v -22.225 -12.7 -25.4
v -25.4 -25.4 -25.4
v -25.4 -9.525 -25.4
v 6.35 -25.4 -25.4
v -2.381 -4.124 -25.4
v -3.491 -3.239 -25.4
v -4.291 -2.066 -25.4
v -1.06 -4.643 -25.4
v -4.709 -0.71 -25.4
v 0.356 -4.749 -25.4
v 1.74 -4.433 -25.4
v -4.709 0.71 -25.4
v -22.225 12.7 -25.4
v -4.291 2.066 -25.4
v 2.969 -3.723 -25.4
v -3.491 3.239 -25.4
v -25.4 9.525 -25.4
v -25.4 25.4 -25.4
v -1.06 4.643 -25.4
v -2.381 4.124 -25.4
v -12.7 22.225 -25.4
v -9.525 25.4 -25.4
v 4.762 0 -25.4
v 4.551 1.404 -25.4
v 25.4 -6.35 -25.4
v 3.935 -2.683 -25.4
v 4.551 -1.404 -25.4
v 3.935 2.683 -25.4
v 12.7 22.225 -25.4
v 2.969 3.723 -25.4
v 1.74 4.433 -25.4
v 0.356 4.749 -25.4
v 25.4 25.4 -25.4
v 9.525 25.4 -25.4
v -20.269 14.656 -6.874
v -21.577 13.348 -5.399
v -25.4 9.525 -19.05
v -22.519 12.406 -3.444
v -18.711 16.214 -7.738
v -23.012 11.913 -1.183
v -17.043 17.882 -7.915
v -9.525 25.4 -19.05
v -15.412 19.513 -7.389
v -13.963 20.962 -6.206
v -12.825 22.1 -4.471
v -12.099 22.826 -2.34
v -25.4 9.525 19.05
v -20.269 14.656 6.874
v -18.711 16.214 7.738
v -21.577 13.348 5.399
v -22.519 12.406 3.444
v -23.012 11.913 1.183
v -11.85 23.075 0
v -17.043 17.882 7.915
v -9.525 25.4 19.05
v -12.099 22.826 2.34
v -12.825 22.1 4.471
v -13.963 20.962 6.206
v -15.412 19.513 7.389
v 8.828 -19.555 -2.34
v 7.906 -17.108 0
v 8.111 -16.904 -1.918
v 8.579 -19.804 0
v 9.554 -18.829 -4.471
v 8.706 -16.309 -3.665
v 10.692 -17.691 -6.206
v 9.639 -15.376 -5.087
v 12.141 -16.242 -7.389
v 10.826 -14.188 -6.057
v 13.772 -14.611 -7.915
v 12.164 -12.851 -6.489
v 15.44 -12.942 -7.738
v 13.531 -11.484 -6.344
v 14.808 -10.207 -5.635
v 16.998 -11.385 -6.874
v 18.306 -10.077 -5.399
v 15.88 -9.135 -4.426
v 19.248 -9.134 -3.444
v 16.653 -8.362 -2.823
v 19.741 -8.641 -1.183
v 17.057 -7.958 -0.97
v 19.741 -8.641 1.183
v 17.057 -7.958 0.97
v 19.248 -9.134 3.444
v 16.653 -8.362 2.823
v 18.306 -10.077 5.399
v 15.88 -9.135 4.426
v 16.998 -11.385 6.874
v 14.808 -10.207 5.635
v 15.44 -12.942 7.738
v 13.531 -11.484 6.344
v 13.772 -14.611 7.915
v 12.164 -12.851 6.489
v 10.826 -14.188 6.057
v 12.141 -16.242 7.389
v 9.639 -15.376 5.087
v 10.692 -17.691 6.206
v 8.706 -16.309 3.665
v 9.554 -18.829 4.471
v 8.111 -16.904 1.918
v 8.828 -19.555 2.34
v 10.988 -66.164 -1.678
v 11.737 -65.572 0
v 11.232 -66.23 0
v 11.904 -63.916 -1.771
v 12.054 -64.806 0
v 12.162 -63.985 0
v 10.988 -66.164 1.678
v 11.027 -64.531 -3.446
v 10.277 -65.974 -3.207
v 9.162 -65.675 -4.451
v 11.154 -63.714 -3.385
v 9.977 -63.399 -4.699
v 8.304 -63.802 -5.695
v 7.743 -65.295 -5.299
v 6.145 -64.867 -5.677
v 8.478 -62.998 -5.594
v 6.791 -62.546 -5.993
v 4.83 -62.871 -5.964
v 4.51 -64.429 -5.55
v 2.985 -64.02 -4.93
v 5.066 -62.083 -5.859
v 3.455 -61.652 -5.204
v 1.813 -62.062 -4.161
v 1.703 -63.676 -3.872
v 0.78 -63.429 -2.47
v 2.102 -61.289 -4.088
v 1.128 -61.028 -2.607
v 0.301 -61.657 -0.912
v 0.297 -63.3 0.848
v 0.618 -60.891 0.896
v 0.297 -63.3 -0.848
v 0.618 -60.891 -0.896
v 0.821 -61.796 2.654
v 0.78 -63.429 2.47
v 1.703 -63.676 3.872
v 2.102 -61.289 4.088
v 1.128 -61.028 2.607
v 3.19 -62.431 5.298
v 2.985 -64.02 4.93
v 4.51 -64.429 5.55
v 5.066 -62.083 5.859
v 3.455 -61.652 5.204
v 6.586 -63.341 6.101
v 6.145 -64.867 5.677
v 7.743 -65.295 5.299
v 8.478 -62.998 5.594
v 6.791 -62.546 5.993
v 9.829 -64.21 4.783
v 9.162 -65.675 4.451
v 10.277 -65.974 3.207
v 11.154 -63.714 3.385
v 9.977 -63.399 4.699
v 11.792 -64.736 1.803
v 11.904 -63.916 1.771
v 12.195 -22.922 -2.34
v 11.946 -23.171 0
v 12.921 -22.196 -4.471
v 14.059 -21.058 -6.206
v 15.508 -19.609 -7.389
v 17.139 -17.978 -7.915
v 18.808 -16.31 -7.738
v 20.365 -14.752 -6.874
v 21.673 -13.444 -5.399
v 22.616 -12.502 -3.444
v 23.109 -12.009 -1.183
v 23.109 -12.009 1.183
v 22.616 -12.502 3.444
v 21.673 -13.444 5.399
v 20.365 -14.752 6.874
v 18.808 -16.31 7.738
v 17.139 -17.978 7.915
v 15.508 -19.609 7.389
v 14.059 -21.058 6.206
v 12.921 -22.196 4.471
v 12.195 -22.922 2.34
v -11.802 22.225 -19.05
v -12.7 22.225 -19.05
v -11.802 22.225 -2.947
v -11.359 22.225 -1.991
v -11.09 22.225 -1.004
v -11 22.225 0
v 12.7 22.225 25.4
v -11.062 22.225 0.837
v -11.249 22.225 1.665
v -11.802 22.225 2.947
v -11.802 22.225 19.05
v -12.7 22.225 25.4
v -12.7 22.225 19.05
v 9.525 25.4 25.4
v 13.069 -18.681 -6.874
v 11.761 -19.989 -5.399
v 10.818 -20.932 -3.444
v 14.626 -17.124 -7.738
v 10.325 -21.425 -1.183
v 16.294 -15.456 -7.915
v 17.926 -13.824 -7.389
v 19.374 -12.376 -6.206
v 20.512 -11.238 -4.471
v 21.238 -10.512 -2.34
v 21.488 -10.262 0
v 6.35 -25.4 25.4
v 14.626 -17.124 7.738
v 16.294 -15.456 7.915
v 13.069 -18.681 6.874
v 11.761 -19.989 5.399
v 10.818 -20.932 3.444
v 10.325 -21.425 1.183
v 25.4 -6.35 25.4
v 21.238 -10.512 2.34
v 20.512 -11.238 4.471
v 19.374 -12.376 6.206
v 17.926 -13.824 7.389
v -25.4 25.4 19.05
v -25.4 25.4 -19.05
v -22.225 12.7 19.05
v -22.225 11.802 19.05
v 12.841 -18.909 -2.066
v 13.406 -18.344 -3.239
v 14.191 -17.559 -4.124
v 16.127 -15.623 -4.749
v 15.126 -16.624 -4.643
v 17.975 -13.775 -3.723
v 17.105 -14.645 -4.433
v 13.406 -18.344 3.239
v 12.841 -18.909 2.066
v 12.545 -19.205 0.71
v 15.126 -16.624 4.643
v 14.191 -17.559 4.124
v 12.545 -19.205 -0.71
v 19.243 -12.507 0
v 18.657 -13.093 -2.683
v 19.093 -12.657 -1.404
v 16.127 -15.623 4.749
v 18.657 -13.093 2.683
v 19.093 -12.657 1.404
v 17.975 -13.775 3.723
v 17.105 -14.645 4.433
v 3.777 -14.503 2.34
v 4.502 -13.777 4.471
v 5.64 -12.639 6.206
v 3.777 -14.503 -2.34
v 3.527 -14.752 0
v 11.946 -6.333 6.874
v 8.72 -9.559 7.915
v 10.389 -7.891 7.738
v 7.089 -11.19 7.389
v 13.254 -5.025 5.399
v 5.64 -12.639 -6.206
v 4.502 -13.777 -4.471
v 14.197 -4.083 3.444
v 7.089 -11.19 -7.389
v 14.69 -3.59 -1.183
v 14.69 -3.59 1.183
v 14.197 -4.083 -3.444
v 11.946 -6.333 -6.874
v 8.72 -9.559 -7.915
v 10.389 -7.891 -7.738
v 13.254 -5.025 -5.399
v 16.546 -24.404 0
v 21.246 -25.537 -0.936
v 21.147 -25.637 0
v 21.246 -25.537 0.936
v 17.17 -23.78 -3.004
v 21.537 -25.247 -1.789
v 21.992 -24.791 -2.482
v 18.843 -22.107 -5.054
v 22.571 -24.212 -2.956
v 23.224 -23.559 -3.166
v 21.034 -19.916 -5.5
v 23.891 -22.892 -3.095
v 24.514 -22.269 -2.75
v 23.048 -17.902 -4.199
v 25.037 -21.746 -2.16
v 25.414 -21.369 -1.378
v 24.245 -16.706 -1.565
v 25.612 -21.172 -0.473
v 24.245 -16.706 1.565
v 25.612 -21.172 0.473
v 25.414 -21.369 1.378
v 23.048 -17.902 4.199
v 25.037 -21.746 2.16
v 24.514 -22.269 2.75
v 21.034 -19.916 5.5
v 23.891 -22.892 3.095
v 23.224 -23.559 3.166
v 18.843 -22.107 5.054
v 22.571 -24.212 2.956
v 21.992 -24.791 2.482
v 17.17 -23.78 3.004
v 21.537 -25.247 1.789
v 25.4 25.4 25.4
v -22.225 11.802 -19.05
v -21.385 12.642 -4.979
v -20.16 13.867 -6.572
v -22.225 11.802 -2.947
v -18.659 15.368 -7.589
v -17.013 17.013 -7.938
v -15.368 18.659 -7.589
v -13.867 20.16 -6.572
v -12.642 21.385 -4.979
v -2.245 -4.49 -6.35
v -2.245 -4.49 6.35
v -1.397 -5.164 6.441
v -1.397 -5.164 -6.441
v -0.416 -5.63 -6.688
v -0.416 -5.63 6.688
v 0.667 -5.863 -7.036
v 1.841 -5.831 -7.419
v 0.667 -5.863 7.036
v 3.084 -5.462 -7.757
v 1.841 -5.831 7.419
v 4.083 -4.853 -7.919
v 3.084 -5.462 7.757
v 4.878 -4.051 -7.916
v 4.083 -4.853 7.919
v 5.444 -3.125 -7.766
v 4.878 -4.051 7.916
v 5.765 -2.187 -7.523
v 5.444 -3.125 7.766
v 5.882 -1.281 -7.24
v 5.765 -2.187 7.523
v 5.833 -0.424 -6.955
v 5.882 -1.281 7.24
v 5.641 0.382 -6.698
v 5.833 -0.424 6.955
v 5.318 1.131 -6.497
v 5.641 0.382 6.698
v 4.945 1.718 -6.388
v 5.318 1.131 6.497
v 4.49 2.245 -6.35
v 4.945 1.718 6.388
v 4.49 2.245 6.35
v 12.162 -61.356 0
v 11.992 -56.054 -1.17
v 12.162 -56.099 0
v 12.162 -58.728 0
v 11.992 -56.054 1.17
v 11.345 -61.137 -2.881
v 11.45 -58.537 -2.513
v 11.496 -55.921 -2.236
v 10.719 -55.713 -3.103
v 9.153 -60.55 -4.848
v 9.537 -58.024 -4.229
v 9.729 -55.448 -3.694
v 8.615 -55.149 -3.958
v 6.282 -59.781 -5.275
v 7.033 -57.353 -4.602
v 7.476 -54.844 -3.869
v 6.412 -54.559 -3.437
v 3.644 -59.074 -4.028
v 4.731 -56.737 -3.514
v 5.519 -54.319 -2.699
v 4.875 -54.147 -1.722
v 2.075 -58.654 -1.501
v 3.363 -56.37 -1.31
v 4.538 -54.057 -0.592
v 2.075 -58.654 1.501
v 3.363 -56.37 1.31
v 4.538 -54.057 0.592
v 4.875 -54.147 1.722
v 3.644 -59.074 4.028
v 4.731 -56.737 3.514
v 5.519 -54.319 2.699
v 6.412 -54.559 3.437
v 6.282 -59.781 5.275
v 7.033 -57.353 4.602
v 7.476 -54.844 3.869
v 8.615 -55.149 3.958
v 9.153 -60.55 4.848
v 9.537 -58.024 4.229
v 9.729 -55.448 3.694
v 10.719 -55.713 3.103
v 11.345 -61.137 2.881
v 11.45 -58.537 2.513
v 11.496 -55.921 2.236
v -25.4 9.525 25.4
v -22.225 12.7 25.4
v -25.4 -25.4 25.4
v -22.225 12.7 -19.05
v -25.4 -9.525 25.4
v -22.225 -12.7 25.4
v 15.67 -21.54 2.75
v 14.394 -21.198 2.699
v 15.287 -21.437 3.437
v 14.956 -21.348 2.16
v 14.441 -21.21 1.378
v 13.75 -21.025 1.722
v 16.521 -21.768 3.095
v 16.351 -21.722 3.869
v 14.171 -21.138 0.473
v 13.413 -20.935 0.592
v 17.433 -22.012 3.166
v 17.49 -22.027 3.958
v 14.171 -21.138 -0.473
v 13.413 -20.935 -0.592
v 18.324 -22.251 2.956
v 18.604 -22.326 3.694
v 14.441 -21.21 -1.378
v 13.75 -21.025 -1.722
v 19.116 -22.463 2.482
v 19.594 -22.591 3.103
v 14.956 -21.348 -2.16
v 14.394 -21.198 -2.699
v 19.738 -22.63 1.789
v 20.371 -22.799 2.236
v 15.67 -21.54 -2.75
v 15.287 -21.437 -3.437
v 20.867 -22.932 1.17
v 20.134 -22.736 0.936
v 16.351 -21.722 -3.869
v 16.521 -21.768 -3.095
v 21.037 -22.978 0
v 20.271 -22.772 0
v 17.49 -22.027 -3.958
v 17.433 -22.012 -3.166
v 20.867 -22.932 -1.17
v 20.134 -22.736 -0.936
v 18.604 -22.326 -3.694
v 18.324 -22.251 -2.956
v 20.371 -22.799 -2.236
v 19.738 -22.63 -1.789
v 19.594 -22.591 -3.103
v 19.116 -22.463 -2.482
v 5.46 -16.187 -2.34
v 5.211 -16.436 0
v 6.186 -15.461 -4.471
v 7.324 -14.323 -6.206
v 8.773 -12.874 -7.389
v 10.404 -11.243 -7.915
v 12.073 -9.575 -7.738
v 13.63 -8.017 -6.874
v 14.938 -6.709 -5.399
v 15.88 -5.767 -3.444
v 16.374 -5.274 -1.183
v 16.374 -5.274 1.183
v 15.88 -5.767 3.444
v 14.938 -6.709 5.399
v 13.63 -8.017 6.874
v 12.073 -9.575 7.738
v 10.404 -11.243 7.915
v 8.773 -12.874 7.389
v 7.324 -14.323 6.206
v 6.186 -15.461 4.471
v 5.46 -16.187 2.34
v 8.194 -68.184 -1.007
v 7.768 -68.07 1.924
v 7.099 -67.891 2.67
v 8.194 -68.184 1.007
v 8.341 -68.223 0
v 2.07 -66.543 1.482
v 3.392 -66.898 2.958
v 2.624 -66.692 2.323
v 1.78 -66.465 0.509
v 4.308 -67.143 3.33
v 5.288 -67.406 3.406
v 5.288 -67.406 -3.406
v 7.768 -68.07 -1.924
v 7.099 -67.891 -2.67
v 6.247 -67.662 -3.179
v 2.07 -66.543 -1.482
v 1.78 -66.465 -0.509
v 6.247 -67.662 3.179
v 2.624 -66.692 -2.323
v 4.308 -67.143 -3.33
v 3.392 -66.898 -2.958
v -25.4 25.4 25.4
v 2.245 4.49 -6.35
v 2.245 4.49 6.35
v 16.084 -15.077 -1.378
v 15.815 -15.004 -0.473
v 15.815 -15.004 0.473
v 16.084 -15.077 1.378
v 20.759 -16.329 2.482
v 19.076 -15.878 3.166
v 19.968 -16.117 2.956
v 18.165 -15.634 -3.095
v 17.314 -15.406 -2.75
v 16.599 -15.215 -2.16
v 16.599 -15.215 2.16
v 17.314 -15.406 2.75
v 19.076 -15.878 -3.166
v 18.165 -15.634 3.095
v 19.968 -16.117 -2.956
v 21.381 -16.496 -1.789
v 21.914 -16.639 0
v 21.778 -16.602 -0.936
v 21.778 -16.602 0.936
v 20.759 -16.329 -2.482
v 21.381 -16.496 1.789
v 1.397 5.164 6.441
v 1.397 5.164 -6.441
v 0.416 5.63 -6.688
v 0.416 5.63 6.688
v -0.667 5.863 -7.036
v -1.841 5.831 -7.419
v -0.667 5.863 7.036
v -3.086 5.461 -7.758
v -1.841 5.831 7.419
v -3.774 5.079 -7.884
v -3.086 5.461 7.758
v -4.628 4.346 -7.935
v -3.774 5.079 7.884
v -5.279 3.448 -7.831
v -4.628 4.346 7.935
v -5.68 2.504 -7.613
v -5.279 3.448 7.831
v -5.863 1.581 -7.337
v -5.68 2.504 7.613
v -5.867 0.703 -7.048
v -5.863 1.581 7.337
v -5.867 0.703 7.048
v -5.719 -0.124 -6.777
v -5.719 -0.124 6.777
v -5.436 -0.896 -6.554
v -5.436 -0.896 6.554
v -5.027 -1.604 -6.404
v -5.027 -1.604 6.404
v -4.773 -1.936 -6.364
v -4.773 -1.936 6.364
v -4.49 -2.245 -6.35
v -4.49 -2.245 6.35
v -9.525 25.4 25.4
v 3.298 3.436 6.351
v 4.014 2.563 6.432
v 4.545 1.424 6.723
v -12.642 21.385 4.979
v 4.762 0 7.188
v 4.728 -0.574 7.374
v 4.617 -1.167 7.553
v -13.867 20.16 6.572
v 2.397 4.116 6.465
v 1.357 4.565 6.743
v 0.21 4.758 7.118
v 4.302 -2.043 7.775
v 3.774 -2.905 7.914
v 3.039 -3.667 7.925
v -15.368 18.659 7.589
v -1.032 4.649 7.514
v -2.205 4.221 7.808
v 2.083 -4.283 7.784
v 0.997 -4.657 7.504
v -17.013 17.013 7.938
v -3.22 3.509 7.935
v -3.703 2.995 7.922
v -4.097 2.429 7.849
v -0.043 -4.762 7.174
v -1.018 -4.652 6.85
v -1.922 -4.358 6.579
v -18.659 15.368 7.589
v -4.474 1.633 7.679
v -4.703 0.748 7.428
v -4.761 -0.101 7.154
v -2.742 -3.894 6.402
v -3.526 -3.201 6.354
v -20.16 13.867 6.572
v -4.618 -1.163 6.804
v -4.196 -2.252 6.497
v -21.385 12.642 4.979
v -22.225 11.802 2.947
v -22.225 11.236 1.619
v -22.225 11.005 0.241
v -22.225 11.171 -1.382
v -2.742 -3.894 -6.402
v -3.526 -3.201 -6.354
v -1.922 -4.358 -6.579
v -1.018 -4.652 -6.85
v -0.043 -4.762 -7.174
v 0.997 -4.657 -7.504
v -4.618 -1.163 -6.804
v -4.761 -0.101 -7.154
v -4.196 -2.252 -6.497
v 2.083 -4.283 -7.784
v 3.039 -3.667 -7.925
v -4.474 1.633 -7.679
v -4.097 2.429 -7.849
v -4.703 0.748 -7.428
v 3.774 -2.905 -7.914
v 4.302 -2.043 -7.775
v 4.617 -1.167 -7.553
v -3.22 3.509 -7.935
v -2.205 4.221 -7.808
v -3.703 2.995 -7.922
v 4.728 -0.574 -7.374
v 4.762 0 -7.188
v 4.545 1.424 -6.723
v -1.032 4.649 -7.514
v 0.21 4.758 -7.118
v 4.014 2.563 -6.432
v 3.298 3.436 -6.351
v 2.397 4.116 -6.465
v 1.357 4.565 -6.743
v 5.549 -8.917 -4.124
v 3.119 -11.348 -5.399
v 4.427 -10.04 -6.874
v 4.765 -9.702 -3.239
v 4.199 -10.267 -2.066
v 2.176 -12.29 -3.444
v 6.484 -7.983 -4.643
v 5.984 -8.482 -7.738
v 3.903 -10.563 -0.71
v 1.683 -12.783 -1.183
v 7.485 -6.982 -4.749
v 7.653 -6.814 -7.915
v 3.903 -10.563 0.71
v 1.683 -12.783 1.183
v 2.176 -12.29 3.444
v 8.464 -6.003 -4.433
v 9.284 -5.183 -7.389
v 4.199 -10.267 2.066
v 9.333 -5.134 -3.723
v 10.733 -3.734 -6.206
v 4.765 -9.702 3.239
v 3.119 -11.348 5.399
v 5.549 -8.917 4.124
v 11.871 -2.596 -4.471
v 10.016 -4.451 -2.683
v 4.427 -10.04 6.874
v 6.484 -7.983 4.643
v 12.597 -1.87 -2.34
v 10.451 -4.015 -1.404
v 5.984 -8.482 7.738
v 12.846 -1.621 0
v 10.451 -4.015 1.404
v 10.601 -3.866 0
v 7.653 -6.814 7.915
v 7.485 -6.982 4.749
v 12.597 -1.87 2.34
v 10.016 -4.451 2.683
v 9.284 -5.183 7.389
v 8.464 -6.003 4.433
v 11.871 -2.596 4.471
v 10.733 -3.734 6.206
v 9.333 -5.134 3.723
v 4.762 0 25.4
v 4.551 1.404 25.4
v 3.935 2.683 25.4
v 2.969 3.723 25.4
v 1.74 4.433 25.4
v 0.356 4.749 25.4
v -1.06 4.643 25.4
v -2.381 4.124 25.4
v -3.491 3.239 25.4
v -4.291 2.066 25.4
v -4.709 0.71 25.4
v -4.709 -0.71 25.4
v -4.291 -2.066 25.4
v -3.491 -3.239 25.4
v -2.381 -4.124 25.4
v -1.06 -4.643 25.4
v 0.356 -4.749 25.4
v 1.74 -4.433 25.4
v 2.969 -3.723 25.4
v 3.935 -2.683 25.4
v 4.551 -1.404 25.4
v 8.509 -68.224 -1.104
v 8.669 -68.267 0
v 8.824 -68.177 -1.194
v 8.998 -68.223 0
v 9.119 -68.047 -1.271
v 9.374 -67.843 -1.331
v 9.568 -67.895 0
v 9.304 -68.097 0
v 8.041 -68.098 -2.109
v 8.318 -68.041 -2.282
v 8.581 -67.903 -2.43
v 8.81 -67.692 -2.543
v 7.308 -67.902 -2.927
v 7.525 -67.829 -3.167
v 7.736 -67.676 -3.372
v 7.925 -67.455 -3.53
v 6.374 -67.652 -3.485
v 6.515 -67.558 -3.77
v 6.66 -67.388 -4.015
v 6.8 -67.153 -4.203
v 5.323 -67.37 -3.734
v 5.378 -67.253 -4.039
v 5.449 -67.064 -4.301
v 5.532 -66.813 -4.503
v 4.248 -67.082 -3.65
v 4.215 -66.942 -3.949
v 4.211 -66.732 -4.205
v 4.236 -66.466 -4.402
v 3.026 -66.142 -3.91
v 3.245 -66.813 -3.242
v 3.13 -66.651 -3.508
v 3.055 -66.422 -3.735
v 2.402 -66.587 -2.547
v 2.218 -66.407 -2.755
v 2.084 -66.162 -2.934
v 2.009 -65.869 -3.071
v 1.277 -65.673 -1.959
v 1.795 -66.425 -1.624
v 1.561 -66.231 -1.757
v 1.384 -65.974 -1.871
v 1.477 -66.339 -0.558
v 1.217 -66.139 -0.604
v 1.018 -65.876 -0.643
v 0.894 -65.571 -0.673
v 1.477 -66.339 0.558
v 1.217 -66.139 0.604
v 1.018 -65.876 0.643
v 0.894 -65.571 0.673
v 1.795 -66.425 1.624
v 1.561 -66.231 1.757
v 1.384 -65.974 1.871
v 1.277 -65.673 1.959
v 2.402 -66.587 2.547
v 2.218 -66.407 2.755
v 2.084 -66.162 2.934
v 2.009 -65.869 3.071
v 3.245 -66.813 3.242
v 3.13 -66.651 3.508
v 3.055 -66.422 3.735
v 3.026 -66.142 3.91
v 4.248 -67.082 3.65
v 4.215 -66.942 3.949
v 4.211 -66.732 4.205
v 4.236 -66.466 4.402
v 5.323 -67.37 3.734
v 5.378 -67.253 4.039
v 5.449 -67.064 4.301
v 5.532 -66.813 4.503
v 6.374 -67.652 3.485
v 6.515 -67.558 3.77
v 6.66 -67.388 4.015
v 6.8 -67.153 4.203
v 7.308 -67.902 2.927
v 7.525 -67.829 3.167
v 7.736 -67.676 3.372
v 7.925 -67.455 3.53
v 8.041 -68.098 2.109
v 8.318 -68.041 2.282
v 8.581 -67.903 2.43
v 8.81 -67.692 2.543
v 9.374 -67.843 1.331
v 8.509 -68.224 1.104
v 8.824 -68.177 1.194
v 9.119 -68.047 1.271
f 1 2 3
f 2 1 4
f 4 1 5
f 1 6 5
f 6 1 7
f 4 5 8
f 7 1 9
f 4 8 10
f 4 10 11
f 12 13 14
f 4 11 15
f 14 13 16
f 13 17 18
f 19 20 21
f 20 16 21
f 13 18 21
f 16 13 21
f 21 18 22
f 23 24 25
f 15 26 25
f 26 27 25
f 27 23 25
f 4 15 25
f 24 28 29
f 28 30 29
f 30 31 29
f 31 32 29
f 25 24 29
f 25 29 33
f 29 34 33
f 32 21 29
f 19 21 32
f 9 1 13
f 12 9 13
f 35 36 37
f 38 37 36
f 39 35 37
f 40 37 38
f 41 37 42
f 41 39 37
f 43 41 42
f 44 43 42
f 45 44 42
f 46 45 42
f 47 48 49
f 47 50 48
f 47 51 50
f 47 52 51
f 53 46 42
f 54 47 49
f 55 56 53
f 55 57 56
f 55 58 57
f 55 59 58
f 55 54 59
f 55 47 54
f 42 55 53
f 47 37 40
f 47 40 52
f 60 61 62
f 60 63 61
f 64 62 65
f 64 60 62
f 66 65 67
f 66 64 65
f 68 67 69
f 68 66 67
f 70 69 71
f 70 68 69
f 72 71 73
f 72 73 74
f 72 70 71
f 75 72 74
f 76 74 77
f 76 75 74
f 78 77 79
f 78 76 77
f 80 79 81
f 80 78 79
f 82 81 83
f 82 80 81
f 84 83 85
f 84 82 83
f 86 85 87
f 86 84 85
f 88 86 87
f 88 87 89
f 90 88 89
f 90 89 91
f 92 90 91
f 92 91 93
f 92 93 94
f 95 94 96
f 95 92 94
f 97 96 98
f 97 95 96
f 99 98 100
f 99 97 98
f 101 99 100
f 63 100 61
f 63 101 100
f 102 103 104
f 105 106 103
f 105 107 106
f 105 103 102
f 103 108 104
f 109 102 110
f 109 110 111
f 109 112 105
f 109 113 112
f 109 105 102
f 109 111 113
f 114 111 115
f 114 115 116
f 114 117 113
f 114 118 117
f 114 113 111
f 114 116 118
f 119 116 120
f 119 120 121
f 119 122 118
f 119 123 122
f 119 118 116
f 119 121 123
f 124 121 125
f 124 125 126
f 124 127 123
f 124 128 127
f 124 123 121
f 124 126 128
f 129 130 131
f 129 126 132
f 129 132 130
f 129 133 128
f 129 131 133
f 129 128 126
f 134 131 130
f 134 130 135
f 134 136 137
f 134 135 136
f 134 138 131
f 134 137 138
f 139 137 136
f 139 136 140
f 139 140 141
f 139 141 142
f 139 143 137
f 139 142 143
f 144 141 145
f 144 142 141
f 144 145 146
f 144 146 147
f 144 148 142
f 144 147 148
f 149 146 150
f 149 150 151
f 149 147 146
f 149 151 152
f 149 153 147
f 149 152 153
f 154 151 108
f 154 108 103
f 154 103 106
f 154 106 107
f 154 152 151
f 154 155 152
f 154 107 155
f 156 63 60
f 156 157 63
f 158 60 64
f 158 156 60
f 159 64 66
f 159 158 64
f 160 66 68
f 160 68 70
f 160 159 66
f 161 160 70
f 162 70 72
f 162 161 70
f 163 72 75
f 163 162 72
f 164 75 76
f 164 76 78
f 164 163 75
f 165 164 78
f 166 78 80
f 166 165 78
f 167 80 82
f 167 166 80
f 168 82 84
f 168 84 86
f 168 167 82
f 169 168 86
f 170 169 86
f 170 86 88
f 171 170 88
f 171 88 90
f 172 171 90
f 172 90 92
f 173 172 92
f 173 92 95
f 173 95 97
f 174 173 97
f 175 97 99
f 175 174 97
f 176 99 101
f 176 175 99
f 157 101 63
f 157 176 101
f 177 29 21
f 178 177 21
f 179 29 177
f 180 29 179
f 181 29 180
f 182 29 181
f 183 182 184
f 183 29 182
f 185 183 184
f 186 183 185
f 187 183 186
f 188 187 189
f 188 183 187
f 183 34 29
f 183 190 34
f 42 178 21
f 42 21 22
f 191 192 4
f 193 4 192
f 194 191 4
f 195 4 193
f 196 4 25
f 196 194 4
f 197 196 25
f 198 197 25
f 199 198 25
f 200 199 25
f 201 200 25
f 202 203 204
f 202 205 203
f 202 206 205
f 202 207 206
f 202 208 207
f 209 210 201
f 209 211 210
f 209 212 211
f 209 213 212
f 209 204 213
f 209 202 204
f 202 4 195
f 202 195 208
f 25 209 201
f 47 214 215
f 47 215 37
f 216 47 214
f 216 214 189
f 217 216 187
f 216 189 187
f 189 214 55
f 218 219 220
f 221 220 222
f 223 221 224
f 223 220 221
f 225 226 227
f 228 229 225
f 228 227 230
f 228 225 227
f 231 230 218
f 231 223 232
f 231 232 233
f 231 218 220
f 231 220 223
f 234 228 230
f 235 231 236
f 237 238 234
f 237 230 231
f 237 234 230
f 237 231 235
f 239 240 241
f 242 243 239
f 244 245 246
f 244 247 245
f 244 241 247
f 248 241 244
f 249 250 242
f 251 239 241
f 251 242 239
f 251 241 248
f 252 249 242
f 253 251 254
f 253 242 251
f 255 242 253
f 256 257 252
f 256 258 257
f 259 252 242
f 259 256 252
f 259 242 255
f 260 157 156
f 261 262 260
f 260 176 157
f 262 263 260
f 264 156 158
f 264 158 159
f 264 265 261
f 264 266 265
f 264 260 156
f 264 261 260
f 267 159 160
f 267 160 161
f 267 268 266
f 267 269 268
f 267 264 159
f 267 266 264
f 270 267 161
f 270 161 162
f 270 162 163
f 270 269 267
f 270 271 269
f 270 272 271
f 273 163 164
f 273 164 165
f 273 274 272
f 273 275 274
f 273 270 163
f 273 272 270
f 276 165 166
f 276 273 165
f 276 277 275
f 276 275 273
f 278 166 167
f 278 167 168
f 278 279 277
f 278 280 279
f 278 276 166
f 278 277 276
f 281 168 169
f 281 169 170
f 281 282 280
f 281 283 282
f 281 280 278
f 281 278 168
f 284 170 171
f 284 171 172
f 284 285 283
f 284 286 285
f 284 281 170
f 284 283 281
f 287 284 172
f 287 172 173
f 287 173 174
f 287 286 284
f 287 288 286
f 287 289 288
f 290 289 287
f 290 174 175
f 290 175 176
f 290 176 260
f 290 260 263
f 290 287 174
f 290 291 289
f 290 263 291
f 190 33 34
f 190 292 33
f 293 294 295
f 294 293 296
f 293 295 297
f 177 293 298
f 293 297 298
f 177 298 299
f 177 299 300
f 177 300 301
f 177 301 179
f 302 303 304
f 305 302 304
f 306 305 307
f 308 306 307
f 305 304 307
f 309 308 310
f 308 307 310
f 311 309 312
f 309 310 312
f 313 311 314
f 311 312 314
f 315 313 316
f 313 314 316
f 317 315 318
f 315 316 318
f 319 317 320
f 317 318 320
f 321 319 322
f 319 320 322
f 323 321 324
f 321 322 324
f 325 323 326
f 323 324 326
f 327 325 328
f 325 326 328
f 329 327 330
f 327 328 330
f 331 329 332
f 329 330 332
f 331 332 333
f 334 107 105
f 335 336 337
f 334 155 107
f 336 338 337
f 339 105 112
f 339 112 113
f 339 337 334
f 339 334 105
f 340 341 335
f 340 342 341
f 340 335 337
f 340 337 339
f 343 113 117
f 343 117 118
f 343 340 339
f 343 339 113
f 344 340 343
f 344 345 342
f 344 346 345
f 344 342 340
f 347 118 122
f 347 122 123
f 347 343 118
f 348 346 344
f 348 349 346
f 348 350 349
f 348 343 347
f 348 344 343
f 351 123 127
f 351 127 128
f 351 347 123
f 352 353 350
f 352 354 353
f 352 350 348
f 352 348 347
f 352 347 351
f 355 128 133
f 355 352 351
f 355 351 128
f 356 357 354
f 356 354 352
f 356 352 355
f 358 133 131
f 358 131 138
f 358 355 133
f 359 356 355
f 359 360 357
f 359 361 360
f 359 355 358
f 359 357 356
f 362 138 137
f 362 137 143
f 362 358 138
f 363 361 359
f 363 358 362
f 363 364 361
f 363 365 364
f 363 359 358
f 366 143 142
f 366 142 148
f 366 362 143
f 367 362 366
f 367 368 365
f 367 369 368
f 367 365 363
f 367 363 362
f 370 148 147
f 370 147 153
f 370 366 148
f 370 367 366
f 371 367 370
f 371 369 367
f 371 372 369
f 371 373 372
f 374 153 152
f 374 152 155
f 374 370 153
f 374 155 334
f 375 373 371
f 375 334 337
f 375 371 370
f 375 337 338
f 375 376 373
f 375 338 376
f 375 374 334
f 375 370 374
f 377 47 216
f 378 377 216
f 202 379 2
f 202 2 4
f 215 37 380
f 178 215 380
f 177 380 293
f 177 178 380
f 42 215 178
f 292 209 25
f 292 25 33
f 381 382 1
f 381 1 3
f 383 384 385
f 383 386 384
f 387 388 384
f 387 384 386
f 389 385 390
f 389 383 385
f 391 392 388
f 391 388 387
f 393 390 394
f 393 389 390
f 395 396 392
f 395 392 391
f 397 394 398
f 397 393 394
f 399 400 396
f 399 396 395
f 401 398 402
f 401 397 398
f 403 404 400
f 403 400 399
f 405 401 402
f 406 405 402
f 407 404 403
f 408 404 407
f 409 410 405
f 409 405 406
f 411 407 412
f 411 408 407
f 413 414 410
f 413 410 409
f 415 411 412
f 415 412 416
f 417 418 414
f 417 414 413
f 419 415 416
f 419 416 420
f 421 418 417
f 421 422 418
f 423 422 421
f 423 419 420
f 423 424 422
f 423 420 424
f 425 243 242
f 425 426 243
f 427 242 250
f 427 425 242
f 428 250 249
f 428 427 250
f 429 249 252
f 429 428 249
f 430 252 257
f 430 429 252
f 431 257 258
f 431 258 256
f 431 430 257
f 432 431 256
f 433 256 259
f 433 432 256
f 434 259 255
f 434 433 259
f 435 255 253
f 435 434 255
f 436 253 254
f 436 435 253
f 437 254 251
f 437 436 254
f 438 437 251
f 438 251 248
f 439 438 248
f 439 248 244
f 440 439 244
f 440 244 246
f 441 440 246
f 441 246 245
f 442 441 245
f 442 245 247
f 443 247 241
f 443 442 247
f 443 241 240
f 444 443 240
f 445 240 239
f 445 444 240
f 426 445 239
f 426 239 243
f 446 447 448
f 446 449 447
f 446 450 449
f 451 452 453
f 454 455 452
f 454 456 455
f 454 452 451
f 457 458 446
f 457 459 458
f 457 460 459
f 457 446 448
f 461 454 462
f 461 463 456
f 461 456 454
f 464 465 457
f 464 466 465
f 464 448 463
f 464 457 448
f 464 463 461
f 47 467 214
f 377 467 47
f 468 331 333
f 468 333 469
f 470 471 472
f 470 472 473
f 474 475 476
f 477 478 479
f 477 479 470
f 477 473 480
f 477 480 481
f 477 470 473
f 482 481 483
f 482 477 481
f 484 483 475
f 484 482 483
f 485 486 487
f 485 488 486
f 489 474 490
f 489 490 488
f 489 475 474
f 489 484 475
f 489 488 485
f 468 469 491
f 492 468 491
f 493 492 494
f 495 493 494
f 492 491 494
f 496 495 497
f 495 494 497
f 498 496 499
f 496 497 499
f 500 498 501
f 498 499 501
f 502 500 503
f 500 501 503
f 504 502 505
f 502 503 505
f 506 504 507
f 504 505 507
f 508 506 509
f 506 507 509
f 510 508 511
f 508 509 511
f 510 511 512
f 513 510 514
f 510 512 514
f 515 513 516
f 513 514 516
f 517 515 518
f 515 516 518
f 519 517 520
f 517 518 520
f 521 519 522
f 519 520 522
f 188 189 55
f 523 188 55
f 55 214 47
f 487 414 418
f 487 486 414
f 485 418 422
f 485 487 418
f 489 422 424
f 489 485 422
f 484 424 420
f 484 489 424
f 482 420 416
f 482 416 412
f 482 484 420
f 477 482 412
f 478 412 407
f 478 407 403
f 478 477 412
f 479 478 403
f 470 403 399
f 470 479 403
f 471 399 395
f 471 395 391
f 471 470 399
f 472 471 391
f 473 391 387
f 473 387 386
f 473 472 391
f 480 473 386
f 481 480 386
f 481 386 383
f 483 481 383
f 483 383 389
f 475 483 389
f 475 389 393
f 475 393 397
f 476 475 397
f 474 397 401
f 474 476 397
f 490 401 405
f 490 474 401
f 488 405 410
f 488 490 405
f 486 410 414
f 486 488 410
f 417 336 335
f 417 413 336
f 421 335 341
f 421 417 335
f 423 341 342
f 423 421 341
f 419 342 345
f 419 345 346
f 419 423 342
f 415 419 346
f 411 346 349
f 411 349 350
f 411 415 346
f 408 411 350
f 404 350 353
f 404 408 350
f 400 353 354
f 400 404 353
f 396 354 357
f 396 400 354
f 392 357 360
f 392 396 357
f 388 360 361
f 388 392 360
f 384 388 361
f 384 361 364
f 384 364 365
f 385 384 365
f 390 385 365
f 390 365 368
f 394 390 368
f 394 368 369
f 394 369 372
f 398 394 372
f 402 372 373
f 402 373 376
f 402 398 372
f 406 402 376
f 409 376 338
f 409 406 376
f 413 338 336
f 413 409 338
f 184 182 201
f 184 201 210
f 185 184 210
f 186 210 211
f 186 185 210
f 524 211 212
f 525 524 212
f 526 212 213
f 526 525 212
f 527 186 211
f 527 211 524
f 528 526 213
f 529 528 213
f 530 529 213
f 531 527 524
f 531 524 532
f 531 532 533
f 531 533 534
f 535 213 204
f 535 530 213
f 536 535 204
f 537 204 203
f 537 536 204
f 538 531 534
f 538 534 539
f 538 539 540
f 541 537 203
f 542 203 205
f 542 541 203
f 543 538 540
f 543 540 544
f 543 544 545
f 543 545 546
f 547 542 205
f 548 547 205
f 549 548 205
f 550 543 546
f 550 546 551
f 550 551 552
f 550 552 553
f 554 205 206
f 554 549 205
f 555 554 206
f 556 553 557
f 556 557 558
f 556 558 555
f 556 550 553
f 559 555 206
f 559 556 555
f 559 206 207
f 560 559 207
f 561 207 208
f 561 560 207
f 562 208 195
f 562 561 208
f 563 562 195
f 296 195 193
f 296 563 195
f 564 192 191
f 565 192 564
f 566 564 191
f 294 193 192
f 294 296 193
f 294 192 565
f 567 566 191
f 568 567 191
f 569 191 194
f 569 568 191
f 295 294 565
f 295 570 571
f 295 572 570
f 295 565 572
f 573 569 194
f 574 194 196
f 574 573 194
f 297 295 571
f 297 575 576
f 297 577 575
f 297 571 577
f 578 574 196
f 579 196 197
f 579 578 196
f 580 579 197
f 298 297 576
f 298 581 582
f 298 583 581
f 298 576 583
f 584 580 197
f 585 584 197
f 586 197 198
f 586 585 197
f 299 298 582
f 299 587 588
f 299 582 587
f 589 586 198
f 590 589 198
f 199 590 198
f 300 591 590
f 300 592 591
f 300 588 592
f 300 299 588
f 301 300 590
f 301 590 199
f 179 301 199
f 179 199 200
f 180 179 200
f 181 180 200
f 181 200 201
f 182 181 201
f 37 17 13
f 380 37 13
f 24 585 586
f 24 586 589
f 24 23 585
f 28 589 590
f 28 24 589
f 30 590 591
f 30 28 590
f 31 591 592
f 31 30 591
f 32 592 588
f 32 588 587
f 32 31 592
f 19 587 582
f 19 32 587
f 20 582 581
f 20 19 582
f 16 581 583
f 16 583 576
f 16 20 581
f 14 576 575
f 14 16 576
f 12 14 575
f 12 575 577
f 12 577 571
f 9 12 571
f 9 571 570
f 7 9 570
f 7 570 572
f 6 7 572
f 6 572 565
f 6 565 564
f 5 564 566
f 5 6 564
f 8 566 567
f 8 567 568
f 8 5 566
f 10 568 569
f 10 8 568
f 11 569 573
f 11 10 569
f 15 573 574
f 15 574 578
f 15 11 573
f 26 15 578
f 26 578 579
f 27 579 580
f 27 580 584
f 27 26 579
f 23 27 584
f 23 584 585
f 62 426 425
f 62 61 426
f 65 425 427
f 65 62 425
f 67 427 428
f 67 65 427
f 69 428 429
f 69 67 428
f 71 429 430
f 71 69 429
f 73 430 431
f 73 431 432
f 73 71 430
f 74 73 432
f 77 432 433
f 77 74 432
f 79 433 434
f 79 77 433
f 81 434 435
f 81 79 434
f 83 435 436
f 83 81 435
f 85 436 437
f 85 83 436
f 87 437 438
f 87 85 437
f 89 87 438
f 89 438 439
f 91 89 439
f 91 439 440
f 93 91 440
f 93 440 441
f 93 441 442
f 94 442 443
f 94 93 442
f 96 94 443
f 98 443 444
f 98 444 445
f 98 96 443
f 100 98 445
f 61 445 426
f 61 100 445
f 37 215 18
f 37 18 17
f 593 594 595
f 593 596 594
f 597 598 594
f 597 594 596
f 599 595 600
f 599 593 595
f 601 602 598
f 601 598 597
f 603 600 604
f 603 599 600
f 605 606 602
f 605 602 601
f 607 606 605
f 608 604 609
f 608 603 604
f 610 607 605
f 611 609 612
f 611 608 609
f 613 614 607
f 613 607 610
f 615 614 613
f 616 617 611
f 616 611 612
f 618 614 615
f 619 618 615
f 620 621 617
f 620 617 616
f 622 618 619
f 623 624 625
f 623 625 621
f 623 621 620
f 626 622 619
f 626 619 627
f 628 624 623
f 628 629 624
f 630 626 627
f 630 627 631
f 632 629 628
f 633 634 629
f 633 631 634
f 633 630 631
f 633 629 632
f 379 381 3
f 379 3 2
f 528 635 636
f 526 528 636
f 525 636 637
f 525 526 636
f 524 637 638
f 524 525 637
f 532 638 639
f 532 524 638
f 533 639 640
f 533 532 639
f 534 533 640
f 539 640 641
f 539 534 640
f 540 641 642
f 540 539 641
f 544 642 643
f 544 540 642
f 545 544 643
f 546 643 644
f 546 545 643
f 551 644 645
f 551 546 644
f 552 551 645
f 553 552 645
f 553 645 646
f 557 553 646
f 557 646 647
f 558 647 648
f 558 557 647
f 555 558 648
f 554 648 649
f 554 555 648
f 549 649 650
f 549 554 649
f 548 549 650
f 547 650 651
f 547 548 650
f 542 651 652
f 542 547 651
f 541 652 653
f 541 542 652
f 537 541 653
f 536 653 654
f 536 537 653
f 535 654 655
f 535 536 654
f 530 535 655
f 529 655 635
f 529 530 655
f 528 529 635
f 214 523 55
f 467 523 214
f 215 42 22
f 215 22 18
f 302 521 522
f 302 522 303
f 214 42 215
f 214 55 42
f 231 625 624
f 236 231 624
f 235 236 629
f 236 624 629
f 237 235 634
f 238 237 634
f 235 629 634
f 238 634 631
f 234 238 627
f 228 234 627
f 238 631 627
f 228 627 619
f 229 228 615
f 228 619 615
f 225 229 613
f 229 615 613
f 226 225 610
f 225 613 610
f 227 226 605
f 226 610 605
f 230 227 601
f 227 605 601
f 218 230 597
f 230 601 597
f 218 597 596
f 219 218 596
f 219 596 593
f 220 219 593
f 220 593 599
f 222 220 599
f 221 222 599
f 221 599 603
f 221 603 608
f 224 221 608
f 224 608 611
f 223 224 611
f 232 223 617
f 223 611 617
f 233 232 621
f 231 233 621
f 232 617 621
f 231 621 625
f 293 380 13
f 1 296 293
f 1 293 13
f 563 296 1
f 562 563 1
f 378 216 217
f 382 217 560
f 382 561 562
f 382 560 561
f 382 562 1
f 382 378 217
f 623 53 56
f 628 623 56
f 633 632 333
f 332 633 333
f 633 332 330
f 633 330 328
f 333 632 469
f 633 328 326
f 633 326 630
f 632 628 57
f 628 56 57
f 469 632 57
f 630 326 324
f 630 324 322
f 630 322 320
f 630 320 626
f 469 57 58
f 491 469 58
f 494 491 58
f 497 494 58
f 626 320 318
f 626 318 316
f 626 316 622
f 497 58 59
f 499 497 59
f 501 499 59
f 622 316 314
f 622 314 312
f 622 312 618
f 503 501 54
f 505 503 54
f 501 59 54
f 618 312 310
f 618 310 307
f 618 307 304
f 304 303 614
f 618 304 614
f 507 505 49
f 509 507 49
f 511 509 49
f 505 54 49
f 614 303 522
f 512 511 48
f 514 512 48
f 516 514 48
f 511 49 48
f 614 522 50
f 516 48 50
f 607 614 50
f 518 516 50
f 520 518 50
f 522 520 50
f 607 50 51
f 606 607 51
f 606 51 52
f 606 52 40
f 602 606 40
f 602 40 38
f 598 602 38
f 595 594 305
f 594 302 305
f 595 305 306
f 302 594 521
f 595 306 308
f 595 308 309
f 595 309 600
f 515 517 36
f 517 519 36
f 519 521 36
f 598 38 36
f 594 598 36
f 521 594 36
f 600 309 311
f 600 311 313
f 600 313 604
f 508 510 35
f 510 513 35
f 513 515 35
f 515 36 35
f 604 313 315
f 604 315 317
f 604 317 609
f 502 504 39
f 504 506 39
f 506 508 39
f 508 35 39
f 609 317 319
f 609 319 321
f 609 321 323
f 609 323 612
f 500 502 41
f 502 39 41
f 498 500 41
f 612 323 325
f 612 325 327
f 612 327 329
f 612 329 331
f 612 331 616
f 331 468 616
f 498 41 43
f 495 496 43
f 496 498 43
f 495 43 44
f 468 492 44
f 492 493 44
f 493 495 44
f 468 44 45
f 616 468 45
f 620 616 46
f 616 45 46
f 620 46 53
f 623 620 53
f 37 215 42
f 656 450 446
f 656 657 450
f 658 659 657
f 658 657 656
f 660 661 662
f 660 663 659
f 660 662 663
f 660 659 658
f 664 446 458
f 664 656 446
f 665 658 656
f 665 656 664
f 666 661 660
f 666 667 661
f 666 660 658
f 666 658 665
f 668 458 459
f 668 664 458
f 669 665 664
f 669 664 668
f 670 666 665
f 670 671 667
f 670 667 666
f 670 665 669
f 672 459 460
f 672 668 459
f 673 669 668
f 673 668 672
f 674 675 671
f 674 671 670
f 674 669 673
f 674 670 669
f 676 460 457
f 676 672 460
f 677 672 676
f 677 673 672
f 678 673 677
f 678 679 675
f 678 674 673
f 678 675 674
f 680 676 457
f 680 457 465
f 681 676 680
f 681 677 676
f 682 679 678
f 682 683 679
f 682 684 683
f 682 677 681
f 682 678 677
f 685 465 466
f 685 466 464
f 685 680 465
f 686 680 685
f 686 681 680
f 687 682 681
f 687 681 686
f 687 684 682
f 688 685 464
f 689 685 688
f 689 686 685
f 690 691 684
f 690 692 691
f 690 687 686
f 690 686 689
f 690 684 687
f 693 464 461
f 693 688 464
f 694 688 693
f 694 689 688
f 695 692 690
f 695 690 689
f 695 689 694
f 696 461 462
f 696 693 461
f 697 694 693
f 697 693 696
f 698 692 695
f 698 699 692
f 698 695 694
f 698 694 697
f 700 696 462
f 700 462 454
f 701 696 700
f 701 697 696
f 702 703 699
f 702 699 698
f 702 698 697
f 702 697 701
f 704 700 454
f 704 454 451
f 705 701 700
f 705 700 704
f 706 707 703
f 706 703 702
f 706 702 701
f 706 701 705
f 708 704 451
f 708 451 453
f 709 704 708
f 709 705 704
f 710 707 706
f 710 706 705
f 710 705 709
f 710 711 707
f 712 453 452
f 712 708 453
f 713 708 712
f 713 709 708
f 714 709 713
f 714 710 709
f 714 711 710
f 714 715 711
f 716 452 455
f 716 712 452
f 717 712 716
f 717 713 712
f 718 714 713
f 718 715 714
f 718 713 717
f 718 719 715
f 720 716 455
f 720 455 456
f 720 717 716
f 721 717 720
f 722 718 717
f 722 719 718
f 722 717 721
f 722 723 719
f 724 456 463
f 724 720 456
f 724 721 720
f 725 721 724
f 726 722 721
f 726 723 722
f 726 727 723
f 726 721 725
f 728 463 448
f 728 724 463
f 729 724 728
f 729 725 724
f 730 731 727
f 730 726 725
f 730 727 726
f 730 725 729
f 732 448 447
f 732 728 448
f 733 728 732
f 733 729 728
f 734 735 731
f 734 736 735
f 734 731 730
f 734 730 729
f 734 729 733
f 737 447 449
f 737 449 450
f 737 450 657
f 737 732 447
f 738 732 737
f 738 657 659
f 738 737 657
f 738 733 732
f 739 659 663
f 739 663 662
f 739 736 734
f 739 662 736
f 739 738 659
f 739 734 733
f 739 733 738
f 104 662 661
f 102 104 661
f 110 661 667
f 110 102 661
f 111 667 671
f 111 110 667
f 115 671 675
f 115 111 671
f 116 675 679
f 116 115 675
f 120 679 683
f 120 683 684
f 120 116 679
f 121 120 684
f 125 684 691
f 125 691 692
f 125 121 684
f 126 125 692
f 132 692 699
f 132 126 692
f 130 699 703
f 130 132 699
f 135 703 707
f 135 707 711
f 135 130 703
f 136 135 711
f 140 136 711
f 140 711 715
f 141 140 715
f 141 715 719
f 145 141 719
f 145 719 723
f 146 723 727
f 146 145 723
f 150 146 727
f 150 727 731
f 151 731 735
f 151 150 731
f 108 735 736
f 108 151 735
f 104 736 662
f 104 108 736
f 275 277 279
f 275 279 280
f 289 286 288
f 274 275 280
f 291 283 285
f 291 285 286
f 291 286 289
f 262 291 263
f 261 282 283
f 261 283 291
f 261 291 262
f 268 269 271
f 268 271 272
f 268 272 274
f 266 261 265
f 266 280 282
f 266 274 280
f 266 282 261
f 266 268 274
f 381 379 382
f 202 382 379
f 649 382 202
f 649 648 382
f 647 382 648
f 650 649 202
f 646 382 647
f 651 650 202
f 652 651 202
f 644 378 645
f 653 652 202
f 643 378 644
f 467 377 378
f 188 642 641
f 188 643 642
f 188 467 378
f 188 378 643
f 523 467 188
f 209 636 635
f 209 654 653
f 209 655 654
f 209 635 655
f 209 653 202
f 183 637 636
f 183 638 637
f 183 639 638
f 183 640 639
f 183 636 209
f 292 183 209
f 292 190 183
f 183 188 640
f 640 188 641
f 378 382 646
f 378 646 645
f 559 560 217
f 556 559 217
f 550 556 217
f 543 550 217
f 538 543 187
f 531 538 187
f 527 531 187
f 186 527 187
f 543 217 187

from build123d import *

# Parameters (mm, degrees)
F1_R      = 4.7625
F2_DEPTH  = 25.4
F3_DEPTH  = 19.05
F4_DEPTH  = 19.05
F5_R      = 7.9375
F6_DEPTH  = 47.1463446356
F7_DEPTH  = 34.925
F8_R      = 4.7625
F9_DEPTH  = 12.2213446356
F11_DEPTH = 50.8010001


with BuildPart() as f2:
    # F1 (on Top) → F2 (new body, symmetric)
    with BuildSketch(Plane.XY):
        Polygon((-11.8019743879, 22.225), (-12.7, 22.225), (-22.225, 12.7), (-22.225, 11.8019743879), align=None)
        Polygon((25.4, -6.35), (25.4, 25.4), (9.525, 25.4), (12.7, 22.225), (-11.8019743879, 22.225), (-22.225, 11.8019743879), (-22.225, -12.7), (-25.4, -9.525), (-25.4, -25.4), (6.35, -25.4), align=None)
        Circle(F1_R, mode=Mode.SUBTRACT)
        Polygon((-12.7, 22.225), (-9.525, 25.4), (-25.4, 25.4), (-25.4, 9.525), (-22.225, 12.7), align=None)
    extrude(amount=F2_DEPTH, both=True)

    # F1 (on Top) → F3 (cut, symmetric)
    with BuildSketch(Plane.XY):
        Polygon((-12.7, 22.225), (-9.525, 25.4), (-25.4, 25.4), (-25.4, 9.525), (-22.225, 12.7), align=None)
        Polygon((-11.8019743879, 22.225), (-12.7, 22.225), (-22.225, 12.7), (-22.225, 11.8019743879), align=None)
    extrude(amount=F3_DEPTH, both=True, mode=Mode.SUBTRACT)

    # F5 (on face) → F6 (cut, through all)
    with BuildSketch(Plane(origin=(-17.4625, 17.4625, 0), x_dir=(0.7071067812, 0.7071067812, 0), z_dir=(0.7071067812, -0.7071067812, 0))):
        Circle(F5_R)
    extrude(amount=F6_DEPTH, mode=Mode.SUBTRACT)


with BuildPart() as f4:
    # F1 (on Top) → F4 (new body, symmetric)
    with BuildSketch(Plane.XY):
        Polygon((-12.7, 22.225), (-9.525, 25.4), (-25.4, 25.4), (-25.4, 9.525), (-22.225, 12.7), align=None)
    extrude(amount=F4_DEPTH, both=True)

    # F5 (on face) → F7 (join)
    with BuildSketch(Plane(origin=(-17.4625, 17.4625, 0), x_dir=(0.7071067812, 0.7071067812, 0), z_dir=(0.7071067812, -0.7071067812, 0))):
        Circle(F5_R)
    extrude(amount=F7_DEPTH)

    # F8 (on face) → F9 (join, through all)
    with BuildSketch(Plane(origin=(7.2332043329, -7.2332043329, 0), x_dir=(0.7071067812, 0.7071067812, 0), z_dir=(0.7071067812, -0.7071067812, 0))):
        Circle(F8_R)
    extrude(amount=F9_DEPTH)

    # F10 (on face) → F11 (cut, through all)
    with BuildSketch(Plane.XY.offset(25.4)):
        with BuildLine():
            Line((4.4901280605, 2.2450640303), (2.2450640303, 4.4901280605))
            ThreePointArc((2.2450640303, 4.4901280605), (-4.4901280605, 4.4901280605), (-4.4901280605, -2.2450640303))
            Line((-4.4901280605, -2.2450640303), (-2.2450640303, -4.4901280605))
            ThreePointArc((-2.2450640303, -4.4901280605), (4.4901280605, -4.4901280605), (4.4901280605, 2.2450640303))
        make_face()
    extrude(amount=-F11_DEPTH, mode=Mode.SUBTRACT)


with BuildPart() as f13:
    # F12 (on Top) → F13 (revolve)
    with BuildSketch(Plane.XY):
        Polygon((23.3916454727, -23.3916454727), (9.1398079092, -9.1398079092), (3.5271478335, -14.7524679849), (5.2109458562, -16.4362660076), (6.2226737785, -15.4245380853), (7.9064718012, -17.108336108), (9.5902698239, -18.7921341307), (8.5785419016, -19.803862053), (11.946137947, -23.1714580984), (21.1465814424, -25.636709503), align=None)
        Polygon((6.2226737785, -15.4245380853), (5.2109458562, -16.4362660076), (7.9064718012, -17.108336108), align=None)
        Polygon((9.5902698239, -18.7921341307), (7.9064718012, -17.108336108), (8.5785419016, -19.803862053), align=None)
    revolve(axis=Axis((0, 0, 0), (0.7071067812, -0.7071067812, 0)))


with BuildPart() as f15:
    # F14 (on Top) → F15 (revolve)
    with BuildSketch(Plane.XY):
        with BuildLine():
            Line((21.9140755042, -16.6387536732), (18.8472610057, -15.817003205))
            Line((18.8472610057, -15.817003205), (5.0418531399, -67.3394867792))
            Line((5.0418531399, -67.3394867792), (8.3407770996, -68.2234307901))
            ThreePointArc((8.3407770996, -68.2234307901), (8.9981774742, -68.2234307901), (9.567502899, -67.8947306028))
            Line((9.567502899, -67.8947306028), (11.2324371661, -66.2297963357))
            ThreePointArc((11.2324371661, -66.2297963357), (11.9206906515, -65.1997522032), (12.1623731358, -63.9847323055))
            Line((12.1623731358, -63.9847323055), (12.1623731358, -56.0994168706))
            Line((12.1623731358, -56.0994168706), (21.0372781924, -22.9778202871))
            Line((21.0372781924, -22.9778202871), (20.2705745678, -22.7723826701))
            Line((20.2705745678, -22.7723826701), (21.9140755042, -16.6387536732))
        make_face()
    revolve(axis=Axis((12.8237458576, -38.2970677779, 0), (0.2588190451, 0.9659258263, 0)))


solid = Compound([f2.part, f4.part, f13.part, f15.part])
